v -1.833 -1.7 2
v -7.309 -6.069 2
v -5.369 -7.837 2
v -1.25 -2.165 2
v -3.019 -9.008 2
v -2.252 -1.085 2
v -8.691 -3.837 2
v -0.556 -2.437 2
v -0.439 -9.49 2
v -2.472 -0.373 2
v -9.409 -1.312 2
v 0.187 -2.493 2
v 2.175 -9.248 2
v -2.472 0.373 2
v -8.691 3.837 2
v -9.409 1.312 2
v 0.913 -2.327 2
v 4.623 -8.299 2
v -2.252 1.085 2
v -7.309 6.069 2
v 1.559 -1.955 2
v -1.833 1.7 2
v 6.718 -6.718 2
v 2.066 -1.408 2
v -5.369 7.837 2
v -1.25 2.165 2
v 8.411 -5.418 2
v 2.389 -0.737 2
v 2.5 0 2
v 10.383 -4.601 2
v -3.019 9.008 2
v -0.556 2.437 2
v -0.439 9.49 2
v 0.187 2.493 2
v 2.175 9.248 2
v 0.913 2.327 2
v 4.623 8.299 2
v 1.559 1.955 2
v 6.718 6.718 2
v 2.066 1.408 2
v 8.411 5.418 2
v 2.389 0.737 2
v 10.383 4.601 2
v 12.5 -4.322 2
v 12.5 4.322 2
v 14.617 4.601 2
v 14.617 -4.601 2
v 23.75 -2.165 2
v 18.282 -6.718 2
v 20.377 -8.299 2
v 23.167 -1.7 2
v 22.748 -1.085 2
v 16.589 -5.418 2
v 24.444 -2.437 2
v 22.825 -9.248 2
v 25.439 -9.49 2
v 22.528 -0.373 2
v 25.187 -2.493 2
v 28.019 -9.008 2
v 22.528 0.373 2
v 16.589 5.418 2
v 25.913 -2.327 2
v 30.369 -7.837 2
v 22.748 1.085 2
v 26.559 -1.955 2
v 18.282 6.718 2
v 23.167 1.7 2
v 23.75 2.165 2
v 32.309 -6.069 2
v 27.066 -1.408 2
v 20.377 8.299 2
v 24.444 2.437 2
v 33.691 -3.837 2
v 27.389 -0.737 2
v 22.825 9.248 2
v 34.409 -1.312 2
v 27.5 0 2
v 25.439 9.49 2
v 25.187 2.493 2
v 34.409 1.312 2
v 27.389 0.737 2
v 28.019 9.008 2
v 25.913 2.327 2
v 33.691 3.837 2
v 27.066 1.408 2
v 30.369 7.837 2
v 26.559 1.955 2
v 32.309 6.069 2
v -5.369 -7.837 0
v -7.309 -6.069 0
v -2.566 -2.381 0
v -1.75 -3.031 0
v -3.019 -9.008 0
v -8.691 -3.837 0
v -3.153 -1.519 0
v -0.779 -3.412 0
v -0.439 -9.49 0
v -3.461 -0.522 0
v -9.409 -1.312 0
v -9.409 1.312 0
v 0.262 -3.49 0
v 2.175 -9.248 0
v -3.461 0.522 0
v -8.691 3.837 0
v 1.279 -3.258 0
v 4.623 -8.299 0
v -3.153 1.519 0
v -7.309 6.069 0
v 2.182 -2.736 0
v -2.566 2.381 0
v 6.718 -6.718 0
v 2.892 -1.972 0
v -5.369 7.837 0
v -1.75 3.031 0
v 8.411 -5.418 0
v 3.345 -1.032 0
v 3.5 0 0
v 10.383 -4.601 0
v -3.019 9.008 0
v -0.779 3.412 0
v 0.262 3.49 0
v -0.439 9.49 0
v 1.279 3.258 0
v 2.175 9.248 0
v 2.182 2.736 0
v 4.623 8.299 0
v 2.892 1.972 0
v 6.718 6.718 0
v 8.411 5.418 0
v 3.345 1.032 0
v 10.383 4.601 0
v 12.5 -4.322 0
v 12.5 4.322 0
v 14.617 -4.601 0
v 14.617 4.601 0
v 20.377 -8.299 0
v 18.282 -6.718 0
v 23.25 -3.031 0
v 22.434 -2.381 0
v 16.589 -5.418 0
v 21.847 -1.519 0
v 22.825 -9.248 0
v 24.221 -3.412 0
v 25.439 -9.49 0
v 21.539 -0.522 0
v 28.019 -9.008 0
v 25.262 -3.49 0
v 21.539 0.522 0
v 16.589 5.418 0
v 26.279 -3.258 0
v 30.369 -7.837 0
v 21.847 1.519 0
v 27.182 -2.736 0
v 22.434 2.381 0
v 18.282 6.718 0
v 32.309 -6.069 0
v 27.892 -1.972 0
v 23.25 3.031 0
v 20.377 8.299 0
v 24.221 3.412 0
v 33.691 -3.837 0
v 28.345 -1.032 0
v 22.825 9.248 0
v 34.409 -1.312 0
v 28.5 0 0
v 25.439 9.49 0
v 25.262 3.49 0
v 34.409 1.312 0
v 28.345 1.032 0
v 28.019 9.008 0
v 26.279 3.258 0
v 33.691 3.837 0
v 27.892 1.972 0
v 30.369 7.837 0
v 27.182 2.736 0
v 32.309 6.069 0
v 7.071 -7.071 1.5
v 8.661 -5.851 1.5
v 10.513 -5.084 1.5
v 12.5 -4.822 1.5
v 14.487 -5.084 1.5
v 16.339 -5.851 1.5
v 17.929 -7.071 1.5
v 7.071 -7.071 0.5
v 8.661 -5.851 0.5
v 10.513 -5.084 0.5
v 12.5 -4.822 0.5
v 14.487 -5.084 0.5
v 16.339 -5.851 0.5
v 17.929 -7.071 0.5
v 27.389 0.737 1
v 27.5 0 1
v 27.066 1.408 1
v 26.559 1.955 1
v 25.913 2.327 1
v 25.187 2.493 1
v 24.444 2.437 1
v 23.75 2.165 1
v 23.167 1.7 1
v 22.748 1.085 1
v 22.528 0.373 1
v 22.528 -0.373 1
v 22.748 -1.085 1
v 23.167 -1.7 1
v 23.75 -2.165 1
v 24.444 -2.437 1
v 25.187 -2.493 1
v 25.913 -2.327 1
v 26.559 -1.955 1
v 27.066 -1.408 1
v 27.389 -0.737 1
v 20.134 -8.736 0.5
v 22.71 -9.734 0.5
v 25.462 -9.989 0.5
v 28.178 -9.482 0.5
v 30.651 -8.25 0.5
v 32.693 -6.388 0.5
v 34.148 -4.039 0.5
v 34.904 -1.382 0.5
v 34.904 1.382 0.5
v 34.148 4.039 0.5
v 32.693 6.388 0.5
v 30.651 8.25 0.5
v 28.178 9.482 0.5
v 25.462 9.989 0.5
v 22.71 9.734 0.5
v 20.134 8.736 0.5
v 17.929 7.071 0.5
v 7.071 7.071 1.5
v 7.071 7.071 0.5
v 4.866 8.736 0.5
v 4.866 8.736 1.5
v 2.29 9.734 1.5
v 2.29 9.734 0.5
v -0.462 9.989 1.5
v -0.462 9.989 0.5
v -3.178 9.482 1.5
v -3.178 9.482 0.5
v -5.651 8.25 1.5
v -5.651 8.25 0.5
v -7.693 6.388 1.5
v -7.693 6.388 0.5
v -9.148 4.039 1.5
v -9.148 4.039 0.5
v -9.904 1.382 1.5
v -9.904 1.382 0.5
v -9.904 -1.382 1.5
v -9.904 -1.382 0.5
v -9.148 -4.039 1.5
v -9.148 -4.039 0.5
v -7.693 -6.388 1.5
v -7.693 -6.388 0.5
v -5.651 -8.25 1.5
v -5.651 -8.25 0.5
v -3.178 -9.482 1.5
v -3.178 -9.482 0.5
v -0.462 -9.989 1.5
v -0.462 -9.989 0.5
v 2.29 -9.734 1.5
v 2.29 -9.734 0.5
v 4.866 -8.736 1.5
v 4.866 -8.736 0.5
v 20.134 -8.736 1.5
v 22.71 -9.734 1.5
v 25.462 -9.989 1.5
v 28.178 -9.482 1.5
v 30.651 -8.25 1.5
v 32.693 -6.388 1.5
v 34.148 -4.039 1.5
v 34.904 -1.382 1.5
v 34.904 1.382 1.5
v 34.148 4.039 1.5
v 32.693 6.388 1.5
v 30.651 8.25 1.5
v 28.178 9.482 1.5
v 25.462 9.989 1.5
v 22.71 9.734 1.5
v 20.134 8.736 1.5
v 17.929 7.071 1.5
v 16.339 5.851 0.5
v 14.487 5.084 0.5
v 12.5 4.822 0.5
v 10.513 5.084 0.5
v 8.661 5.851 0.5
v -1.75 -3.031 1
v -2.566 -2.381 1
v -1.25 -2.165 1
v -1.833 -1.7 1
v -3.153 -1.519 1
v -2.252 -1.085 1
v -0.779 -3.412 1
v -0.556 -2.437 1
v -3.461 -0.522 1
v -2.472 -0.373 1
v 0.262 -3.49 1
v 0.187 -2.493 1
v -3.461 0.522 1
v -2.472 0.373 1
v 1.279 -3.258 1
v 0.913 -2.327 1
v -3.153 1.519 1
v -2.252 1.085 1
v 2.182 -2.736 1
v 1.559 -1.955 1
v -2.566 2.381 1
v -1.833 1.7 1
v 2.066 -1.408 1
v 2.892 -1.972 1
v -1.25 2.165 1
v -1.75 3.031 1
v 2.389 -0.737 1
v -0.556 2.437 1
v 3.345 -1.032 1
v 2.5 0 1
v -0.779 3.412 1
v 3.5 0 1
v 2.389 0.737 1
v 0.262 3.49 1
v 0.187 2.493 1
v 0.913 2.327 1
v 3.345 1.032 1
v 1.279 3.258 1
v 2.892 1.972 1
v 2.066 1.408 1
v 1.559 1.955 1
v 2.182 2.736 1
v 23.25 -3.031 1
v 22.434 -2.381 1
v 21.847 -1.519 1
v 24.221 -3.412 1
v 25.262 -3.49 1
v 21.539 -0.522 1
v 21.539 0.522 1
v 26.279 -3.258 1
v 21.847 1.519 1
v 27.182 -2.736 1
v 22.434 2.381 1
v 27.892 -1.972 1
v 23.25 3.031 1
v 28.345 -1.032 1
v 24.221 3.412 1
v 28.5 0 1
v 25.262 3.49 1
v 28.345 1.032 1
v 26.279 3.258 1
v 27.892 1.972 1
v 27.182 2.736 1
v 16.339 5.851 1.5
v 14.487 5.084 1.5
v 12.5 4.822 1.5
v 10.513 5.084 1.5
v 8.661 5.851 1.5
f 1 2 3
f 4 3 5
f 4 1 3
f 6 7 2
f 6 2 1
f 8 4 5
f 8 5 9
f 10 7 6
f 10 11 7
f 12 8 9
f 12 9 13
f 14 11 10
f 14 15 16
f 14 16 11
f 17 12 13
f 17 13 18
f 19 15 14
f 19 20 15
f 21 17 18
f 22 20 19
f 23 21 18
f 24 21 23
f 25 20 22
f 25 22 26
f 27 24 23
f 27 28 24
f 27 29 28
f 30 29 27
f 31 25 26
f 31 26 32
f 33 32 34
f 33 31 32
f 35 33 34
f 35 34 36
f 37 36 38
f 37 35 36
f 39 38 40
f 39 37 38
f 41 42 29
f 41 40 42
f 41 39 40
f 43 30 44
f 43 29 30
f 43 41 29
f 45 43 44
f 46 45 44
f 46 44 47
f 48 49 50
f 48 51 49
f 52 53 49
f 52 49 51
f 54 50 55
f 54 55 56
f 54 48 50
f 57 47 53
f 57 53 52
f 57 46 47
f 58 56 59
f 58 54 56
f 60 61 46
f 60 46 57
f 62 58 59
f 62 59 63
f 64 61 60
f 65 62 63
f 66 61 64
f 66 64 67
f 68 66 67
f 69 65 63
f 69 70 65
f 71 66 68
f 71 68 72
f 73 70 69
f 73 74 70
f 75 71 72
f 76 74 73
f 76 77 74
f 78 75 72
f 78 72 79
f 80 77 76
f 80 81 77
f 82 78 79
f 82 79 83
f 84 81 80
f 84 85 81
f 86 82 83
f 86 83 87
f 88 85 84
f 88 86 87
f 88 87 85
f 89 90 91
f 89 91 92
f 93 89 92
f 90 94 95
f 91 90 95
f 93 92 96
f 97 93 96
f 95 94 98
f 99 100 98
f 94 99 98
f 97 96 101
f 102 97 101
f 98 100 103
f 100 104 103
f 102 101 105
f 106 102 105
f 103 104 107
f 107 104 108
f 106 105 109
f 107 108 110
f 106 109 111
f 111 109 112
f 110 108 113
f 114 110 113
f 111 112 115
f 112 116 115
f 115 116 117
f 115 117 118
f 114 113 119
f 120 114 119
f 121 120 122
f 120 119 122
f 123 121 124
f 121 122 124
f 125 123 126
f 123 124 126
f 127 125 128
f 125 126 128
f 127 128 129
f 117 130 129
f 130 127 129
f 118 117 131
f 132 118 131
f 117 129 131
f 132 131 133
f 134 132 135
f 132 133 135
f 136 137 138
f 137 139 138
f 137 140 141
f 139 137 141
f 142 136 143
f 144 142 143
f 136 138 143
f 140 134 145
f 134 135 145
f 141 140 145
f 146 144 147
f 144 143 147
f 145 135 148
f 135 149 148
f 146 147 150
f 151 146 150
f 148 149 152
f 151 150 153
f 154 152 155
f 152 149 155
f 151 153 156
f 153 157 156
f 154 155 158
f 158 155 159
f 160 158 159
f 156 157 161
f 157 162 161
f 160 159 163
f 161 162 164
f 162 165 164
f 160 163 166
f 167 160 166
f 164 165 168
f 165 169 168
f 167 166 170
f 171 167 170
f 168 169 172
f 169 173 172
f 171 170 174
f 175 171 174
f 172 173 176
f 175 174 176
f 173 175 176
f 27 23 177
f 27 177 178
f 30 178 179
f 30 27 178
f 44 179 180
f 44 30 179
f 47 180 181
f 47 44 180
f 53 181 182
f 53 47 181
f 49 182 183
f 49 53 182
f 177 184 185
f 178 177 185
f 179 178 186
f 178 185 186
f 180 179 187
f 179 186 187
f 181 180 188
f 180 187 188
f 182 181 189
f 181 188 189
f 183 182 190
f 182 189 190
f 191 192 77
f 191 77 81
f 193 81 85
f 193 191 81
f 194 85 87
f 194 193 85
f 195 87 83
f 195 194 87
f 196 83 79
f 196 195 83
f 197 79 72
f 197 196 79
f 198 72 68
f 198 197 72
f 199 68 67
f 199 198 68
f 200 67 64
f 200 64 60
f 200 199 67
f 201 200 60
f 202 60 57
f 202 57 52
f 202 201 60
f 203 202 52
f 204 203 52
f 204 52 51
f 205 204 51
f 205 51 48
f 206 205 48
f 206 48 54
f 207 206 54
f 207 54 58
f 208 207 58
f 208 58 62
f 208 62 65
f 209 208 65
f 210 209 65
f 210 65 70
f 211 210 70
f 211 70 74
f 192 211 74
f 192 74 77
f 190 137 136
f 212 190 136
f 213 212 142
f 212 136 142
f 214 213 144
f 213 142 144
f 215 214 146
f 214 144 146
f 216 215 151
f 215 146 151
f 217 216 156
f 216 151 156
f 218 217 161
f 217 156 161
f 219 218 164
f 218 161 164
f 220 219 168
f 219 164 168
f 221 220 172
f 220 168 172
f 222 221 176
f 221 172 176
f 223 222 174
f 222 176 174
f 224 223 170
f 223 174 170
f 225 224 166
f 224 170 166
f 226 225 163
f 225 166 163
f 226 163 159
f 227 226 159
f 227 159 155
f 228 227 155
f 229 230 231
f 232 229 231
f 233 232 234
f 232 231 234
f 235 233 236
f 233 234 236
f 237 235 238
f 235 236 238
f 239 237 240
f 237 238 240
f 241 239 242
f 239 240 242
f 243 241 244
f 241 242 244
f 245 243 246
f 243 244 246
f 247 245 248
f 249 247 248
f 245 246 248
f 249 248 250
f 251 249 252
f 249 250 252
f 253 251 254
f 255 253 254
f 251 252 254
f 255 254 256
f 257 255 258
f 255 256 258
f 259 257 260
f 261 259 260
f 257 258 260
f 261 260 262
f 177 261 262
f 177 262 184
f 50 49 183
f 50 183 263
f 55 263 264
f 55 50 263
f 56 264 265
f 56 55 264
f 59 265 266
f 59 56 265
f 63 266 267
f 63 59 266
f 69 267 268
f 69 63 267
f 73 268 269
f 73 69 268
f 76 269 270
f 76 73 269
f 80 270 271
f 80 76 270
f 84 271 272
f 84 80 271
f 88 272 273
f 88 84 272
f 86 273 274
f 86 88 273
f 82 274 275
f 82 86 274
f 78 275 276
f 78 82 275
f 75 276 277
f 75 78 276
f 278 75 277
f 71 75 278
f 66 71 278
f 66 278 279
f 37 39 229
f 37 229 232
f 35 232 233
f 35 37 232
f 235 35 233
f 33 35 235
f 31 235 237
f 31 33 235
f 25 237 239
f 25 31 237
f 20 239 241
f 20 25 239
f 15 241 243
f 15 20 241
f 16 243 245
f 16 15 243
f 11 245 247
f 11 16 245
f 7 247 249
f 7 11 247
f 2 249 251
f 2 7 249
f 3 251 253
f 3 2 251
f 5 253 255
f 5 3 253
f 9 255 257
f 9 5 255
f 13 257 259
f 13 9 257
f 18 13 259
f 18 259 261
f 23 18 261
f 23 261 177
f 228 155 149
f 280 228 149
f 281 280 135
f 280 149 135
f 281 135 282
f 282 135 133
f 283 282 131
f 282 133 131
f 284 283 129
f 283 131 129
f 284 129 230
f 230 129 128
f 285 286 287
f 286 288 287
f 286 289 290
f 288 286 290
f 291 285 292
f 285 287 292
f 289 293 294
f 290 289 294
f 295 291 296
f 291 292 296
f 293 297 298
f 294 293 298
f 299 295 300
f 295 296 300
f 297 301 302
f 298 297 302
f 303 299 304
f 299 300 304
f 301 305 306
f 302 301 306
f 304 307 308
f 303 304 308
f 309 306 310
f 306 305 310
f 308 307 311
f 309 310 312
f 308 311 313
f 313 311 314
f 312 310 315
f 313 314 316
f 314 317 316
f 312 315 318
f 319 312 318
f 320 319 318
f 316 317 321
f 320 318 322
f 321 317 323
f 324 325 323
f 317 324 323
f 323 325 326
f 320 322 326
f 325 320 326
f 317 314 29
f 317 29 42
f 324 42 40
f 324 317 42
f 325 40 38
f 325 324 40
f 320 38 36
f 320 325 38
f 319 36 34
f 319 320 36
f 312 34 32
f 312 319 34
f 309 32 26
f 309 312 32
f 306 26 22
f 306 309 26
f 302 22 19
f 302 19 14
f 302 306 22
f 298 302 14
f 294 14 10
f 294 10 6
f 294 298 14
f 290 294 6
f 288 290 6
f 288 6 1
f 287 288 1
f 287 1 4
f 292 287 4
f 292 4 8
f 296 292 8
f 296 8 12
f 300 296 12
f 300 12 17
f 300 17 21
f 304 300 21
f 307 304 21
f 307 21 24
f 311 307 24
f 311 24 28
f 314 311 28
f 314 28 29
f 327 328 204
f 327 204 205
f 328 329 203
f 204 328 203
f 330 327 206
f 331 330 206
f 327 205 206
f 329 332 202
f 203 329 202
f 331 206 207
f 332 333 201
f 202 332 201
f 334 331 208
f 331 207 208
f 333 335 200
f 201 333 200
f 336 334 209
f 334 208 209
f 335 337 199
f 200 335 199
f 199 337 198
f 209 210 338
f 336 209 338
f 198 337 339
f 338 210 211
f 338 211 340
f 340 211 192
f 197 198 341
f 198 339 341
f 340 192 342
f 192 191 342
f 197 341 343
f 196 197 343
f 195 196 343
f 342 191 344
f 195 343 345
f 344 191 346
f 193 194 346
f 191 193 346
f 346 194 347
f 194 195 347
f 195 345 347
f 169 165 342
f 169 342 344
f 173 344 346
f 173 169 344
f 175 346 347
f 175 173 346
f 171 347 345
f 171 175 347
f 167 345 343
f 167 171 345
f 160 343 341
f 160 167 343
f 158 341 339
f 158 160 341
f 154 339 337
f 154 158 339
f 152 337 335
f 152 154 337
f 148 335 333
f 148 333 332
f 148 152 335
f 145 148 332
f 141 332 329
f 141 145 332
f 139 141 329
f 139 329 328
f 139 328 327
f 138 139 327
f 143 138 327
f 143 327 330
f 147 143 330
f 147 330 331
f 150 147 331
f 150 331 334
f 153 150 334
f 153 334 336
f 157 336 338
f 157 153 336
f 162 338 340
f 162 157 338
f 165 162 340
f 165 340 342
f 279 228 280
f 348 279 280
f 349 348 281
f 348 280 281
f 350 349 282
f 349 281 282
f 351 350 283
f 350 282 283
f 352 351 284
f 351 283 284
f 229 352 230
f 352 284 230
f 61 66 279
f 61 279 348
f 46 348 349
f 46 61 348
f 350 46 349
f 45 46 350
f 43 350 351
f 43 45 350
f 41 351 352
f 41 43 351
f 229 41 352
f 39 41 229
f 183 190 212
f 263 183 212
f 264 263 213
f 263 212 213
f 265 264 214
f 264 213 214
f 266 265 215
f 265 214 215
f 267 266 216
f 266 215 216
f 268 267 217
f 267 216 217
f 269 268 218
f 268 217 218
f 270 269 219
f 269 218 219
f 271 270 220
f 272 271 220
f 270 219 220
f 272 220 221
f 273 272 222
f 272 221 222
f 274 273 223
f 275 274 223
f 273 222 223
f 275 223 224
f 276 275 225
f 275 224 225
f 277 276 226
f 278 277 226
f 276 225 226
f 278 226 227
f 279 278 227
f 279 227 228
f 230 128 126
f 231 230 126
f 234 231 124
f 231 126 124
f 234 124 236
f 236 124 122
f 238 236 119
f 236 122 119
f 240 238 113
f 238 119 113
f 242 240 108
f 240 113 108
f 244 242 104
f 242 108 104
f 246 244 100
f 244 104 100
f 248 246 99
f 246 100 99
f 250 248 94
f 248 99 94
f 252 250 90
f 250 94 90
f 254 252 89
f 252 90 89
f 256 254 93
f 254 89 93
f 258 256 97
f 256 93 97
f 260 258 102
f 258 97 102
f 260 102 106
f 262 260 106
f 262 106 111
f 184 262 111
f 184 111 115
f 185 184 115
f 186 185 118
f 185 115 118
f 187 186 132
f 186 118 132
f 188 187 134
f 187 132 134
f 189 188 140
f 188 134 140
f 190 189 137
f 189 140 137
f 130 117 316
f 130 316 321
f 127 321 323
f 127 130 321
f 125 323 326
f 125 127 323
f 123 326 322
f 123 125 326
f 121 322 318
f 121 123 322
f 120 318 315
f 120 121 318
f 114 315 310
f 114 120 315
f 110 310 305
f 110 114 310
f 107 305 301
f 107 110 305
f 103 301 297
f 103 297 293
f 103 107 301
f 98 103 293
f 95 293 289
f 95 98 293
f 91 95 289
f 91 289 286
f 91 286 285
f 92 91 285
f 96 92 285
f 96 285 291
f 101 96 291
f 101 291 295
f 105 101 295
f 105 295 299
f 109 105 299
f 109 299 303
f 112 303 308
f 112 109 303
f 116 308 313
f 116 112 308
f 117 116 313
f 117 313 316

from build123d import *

# Parameters (mm, degrees)
SKETCH1_R           = 2.5
BOSS_EXTRUDE1_DEPTH = 2
CHAMFER1_SIZE       = 0.5
SKETCH2_R           = 3.5
CUT_EXTRUDE1_DEPTH  = 1


with BuildPart() as part:
    # Sketch1 → Boss-Extrude1 (new body)
    with BuildSketch(Plane.XY):
        with BuildLine():
            ThreePointArc((17.928932188, -7.071067812), (35, 0), (17.928932188, 7.071067812))
            ThreePointArc((17.928932188, 7.071067812), (12.5, 4.82233047), (7.071067812, 7.071067812))
            ThreePointArc((7.071067812, 7.071067812), (-10, 0), (7.071067812, -7.071067812))
            ThreePointArc((7.071067812, -7.071067812), (12.5, -4.82233047), (17.928932188, -7.071067812))
        make_face()
        with Locations((25, 0)):
            Circle(SKETCH1_R, mode=Mode.SUBTRACT)
        Circle(SKETCH1_R, mode=Mode.SUBTRACT)
    extrude(amount=BOSS_EXTRUDE1_DEPTH)

    # Chamfer1
    chamfer1_edges = [part.edges().sort_by_distance(p)[0] for p in [
        (12.5, -4.82233047, 2),
        (35, 0, 2),
        (12.5, 4.82233047, 2),
        (35, 0, 0),
        (12.5, -4.82233047, 0),
        (-10, 0, 0),
        (12.5, 4.82233047, 0),
        (-10, 0, 2),
    ]]
    chamfer(chamfer1_edges, length=CHAMFER1_SIZE)

    # Sketch2 → Cut-Extrude1 (cut)
    with BuildSketch(Plane.XY):
        Circle(SKETCH2_R)
        with Locations((25, 0)):
            Circle(SKETCH2_R)
    extrude(amount=CUT_EXTRUDE1_DEPTH, mode=Mode.SUBTRACT)


solid = part.part
